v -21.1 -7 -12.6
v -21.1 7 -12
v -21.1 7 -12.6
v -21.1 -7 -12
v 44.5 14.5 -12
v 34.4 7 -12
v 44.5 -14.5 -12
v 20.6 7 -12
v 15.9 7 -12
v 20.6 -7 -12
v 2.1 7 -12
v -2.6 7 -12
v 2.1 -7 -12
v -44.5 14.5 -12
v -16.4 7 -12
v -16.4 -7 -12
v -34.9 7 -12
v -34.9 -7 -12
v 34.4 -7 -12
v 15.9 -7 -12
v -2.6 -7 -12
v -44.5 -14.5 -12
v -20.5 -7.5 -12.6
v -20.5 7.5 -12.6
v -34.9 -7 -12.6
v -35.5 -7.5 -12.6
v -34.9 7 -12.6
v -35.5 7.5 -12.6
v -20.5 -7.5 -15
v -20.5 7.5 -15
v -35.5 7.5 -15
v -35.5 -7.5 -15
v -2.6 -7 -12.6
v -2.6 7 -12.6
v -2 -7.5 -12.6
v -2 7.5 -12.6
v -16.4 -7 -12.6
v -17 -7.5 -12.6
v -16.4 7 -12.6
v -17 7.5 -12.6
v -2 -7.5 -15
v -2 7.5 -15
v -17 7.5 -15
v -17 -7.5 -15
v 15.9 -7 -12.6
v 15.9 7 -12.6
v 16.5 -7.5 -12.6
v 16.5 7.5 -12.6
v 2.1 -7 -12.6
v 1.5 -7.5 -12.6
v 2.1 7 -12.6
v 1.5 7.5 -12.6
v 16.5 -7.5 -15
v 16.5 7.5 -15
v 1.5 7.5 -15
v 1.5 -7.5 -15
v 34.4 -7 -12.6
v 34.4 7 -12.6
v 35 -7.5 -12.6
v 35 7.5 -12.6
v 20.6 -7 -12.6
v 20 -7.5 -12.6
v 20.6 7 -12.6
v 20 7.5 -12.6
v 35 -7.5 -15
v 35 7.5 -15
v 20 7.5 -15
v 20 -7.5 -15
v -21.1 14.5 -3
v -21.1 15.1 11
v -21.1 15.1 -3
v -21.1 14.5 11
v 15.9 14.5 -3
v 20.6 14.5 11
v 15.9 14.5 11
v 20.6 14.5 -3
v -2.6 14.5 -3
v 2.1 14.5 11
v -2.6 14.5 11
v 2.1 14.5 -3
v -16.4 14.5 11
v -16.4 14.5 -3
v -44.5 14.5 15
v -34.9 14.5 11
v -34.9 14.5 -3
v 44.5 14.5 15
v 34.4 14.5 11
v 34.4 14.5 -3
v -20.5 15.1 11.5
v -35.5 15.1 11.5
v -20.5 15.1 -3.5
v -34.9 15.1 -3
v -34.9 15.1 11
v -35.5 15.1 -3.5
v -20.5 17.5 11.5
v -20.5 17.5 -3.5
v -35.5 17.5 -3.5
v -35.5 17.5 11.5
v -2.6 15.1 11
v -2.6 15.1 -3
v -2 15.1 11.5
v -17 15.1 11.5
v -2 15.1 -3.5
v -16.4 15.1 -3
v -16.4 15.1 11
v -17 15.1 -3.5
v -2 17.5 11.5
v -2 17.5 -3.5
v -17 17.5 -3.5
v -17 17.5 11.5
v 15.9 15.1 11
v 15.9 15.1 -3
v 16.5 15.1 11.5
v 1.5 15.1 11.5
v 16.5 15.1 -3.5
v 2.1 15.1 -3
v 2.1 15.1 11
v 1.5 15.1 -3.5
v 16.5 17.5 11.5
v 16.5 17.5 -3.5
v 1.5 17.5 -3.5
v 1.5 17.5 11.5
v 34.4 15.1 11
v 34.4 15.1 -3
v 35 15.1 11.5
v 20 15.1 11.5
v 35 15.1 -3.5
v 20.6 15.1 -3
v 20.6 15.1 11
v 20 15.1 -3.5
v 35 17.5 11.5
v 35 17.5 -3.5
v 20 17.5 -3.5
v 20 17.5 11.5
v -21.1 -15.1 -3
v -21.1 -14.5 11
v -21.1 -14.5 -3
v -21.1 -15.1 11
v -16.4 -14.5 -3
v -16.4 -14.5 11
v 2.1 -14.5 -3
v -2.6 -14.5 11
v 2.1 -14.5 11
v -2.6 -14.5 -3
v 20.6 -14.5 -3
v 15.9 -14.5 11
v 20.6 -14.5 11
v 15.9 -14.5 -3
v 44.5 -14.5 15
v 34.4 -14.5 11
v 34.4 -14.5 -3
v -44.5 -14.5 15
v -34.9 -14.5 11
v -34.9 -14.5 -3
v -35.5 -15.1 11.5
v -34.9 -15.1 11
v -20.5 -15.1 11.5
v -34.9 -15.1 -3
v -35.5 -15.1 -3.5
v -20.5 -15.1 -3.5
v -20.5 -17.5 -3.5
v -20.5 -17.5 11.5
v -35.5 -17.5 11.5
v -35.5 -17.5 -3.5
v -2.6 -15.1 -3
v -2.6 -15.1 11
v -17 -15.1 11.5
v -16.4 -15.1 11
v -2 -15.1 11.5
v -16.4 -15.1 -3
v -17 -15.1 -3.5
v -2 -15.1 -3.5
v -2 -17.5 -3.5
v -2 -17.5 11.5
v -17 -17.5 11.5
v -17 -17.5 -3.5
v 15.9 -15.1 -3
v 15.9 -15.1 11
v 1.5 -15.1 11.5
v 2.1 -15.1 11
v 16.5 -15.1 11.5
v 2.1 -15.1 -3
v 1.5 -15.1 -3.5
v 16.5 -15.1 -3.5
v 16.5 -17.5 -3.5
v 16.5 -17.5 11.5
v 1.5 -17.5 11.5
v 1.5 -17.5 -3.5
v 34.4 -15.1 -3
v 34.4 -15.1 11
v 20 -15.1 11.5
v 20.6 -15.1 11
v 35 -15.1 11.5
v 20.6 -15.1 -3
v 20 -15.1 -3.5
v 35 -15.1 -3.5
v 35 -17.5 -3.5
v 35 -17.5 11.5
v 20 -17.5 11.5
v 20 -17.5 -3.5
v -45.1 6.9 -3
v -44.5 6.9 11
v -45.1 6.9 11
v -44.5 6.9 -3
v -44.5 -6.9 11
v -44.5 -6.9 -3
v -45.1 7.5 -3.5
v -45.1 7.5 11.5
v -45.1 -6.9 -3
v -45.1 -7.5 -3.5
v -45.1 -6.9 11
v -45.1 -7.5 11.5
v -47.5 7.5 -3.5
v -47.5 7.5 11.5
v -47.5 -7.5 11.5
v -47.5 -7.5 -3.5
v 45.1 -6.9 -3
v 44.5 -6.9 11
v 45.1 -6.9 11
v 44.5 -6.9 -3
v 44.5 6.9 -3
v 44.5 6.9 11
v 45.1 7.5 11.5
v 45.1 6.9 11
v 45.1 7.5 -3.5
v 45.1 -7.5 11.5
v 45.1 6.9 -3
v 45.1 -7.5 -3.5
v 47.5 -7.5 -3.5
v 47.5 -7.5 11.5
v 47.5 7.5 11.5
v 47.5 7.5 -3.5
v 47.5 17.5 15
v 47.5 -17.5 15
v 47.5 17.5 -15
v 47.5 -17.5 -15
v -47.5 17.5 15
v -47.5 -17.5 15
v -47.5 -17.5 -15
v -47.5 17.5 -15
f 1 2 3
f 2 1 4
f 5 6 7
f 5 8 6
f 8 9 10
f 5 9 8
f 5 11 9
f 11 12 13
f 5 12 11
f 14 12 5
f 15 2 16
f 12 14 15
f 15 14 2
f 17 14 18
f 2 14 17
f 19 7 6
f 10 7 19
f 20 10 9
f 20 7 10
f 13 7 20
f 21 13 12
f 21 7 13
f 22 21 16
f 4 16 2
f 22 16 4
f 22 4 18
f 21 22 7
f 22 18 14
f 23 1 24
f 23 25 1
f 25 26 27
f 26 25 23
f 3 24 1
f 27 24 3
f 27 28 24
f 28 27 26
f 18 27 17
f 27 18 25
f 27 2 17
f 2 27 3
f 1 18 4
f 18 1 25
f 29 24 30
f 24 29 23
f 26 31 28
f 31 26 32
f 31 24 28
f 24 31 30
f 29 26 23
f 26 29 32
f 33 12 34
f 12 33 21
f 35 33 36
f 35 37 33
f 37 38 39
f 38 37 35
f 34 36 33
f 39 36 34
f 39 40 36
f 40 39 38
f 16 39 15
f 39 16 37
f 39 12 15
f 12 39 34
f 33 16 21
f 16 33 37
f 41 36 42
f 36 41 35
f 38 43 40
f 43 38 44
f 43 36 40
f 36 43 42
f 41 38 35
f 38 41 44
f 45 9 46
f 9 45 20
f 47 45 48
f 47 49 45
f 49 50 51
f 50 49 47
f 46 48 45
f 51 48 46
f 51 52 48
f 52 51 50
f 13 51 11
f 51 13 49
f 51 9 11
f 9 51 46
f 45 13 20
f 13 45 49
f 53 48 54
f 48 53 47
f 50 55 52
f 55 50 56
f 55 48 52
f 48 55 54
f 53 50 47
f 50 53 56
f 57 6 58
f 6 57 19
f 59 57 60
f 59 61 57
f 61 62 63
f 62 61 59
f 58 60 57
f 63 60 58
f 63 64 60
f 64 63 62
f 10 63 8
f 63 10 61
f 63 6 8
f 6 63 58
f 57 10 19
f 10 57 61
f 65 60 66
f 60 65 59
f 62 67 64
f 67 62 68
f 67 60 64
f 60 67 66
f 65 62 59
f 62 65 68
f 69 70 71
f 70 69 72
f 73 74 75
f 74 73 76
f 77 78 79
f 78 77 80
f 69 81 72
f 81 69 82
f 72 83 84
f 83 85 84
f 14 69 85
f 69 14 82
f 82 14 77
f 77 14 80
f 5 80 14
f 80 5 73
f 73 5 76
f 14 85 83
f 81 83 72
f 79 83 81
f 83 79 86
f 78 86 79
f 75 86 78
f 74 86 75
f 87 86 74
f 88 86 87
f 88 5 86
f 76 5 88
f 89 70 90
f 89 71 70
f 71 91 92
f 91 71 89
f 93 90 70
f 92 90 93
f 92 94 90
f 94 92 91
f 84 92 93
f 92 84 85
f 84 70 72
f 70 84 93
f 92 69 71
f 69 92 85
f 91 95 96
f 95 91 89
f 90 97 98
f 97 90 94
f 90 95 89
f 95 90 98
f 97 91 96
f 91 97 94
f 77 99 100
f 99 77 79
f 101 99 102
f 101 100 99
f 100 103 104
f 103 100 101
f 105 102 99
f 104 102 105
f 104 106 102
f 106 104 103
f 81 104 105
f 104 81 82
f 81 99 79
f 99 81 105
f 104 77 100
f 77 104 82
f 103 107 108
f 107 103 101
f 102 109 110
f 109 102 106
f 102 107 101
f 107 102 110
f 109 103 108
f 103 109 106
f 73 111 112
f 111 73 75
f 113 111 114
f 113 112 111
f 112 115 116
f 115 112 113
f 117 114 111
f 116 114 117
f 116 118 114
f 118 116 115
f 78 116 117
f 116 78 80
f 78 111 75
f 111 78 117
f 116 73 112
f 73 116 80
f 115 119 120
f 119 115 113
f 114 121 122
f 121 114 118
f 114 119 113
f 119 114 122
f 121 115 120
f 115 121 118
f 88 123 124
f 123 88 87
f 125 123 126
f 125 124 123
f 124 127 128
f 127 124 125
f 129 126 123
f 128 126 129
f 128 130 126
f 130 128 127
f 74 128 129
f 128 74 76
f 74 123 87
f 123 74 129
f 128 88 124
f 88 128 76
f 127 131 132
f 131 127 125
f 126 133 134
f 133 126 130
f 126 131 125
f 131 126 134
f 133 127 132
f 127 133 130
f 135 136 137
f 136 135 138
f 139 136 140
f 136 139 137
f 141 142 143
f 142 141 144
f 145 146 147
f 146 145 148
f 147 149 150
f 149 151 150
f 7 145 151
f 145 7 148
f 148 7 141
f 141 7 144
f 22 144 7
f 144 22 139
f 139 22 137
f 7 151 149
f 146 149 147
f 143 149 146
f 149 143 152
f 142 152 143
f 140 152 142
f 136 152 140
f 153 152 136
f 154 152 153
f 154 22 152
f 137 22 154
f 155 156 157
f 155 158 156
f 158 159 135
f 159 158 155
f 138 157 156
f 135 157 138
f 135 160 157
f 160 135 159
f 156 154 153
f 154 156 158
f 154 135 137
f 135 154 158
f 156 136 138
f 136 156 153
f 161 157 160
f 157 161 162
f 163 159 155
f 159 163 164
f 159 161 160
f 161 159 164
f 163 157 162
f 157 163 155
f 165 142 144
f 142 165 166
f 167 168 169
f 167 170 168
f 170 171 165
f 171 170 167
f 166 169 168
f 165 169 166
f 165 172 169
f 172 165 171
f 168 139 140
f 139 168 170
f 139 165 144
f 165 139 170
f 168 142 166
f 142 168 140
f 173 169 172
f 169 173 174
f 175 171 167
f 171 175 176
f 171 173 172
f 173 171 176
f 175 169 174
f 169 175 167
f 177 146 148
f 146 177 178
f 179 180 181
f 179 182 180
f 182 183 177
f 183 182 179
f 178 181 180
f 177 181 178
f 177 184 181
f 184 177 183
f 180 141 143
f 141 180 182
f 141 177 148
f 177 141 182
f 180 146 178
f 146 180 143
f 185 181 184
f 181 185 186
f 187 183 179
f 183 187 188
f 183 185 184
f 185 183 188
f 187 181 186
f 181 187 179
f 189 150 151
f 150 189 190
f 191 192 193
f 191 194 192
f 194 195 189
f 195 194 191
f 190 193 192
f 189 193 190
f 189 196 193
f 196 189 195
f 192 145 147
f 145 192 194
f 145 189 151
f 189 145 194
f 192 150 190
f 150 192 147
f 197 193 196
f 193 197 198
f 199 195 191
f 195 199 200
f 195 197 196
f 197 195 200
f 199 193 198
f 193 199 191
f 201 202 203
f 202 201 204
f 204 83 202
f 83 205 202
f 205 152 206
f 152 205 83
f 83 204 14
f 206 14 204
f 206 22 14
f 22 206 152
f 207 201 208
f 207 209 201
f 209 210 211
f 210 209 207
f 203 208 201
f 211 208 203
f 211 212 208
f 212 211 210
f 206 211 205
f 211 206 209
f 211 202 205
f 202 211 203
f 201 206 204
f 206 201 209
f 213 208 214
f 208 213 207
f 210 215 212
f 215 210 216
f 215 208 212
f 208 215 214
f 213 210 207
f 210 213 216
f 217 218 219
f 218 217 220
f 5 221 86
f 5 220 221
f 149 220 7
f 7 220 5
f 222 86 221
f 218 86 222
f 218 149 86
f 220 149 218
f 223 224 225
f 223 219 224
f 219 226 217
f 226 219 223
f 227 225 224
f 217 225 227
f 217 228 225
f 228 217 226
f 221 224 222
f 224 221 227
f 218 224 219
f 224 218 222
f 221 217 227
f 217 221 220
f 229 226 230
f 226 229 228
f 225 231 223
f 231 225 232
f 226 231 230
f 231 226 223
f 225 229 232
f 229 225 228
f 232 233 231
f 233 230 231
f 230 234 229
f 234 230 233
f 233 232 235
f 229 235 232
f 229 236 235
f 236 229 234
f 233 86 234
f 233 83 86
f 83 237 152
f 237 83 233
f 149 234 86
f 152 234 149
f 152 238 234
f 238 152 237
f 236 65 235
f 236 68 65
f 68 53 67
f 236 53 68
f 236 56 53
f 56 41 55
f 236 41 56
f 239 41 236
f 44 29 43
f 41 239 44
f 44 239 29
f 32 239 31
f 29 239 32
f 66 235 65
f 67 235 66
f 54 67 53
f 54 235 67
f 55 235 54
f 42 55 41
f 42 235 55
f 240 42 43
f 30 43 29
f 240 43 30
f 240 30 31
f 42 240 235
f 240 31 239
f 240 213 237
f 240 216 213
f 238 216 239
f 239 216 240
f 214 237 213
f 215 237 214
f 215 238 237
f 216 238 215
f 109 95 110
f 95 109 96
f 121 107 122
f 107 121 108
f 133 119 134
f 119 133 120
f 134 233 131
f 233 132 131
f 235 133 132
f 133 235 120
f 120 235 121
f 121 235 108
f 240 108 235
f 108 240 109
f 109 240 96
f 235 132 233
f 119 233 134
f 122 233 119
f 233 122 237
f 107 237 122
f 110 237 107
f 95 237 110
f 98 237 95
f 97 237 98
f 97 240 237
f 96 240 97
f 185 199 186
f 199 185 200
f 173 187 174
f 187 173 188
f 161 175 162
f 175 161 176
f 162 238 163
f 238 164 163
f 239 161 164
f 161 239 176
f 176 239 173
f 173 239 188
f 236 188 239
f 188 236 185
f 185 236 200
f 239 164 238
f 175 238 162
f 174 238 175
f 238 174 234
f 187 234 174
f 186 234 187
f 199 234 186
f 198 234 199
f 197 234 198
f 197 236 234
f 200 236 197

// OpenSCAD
// file: kailhsocket.scad
$fn = $preview ? 10 : 60;

// hotswap
cyl_h = 3.05;
cyl_d = 3;

base_x = 4.75;
base_x_sum = 9.55;
base_y = 4.65;
base_y_sum = 6.85;
base_z = 1.8;

clip_x = 1.68;
clip_y = (13.15 - 9.95) / 2;
clip_z = 1.85;

// based on:
// https://www.kailhswitch.com/Content/upload/pdf/201915927/CPG135001D03_-_White_Clicky_Choc.pdf
module kailh_choc_switch()
{
    color("orange") union()
    {
        cube([ 15, 15, 0.8 ]);
        translate([ 0.6, 0.7, 0.8 ]) cube([ 13.8, 13.6, 2.2 ]);

        translate([ 7.5, 7.5, 3 ])
        {
            cylinder(h = 3, d = 3.4);

            translate([ 0, +5.5, 0 ]) cylinder(h = 3, d = 1.9);
            translate([ 0, -5.5, 0 ]) cylinder(h = 3, d = 1.9);

            // contacts
            translate([ -5.9, 0, 0 ]) cylinder(h = 3, d = 1.2);
            translate([ -3.8, -5, 0 ]) cylinder(h = 3, d = 1.2);
        }
    }
}

// based on:
// https://www.kailhswitch.com/Content/upload/pdf/202115927/CPG135001S30-data-sheet.pdf
module kailh_hot_swap_choc(extend_cables = 0)
{

    // fuck
    mirror([ 0, 0, 1 ]) union()
    {
        // plastic
        color("darkgray")
        {
            cube([ base_x, base_y, base_z ]);

            translate([ base_x_sum - base_x, base_y_sum - base_y, 0 ]) cube([ base_x, base_y, base_z ]);

            translate([ base_x / 2, base_y / 2, 0 ])
            {
                cylinder(h = cyl_h, d = cyl_d);
                translate([ 5, 2.2, 0 ]) cylinder(h = cyl_h, d = cyl_d);
            }
            translate([ base_x, 0, 0 ]) rotate([ 0, 0, 45 ]) cube([ base_x, base_y, base_z ]);
        }

        // metal
        color("gray")
        {
            translate([ -clip_x - extend_cables, base_y / 2 - clip_y / 2, 0 ])
                cube([ clip_x + base_y / 2 + extend_cables, clip_y, clip_z ]);
            translate([ base_x_sum - base_y / 2, base_y_sum - base_y / 2 - clip_y / 2, 0 ])
                cube([ clip_x + base_y / 2 + extend_cables, clip_y, clip_z ]);
        }
    }
}

module kailh_choc_socket()
{
    tolerance = 0.2;
    union()
    {
#translate([ 0, 0, -0.4 + tolerance / 2 ]) cube([ 13.6 + tolerance, 13.8 + tolerance, 0.8 - tolerance ], center = true);
        % translate([ -3, 3, 0 ]) text("↑", size = 5);
        // keycap
        % translate([ 0, 0, 5 ]) cube([ 17.5, 16.6, 5.2 ], center = true);
        translate([ 0, 0, -0.8 + tolerance - 2.5 ]) cube([ 15, 15, 5 ], center = true);
    }
}

difference()
{
    cube([ 20, 20, 3 ]);
    translate([ 2.5, 2.5, 0 ])
    {
        translate([ 0, 0, -3 ]) kailh_choc_switch();

        translate([ 7.5 - 3.8 + base_y / 2 + .05, 0.1, 3 ]) rotate([ 0, 0, 90 ]) kailh_hot_swap_choc(10);
    }
}

kailh_choc_socket();
// main file
use <kailhsocket.scad>

w = 95;
h = 35;
d = 30;

t = 3;
!difference()
{
    cube([ w, h, d ], center = true);

    translate([ 0, 0, t ])
    {
        cube([ w - t * 2, h - t * 2, d ], center = true);
    }

    // middle
    for (i = [0:3])
    {
        translate([ i * 18.5 - 28, 0, -d / 2 + t ])
        {
            kailh_choc_socket();
        }
    }

    // top
    for (i = [0:3])
    {
        rotate([ 90, 0, 0 ])
        {
            translate([ i * 18.5 - 28, 4, -h / 2 + t ])
            {
                kailh_choc_socket();
            }
        }
    }

    // bottom
    for (i = [0:3])
    {
        rotate([ -90, 0, 0 ])
        {
            translate([ i * 18.5 - 28, -4, -h / 2 + t ])
            {
                kailh_choc_socket();
            }
        }
    }

    // left
    rotate([ 90, 0, 90 ])
    {
        translate([ 0, 4, -w / 2 + t ])
        {
            kailh_choc_socket();
        }
    }

    // right
    rotate([ -90, 180, 90 ])
    {
        translate([ 0, 4, -w / 2 + t ])
        {
            kailh_choc_socket();
        }
    }
}

// case
gap = 5;
union(){difference(){translate([ 0, 0, -gap / 2 - t / 2 ])
                         cube([ w + t * 2 + gap * 2, h + gap * 2 + t * 2, d + gap + t ], center = true);
cube([ w + gap * 2, h + gap * 2, d + gap * 2 ], center = true);
}

difference()
{
    union()
    {
        translate([ w / 2, h / 2, -d / 2 ]) cube(gap * 2, center = true);
        translate([ w / 2, -h / 2, -d / 2 ]) cube(gap * 2, center = true);
        translate([ -w / 2, -h / 2, -d / 2 ]) cube(gap * 2, center = true);
        translate([ -w / 2, h / 2, -d / 2 ]) cube(gap * 2, center = true);
    }
    cube([ w, h, d ], center = true);
}
}

// lid
*difference()
{
    translate([ 0, 0, d / 2 + t / 2 ]) cube([ w + t * 2 + gap * 2, h + gap * 2 + t * 2, t * 2 ], center = true);

    union()
    {
        cube([ w, h, d ], center = true);

        translate([ 0, 0, t * 2 ])
        {
            cube([ w - t * 2, h - t * 2, d ], center = true);
        }
    }
    difference()
    {
        translate([ 0, 0, -gap / 2 - t / 2 ])
            cube([ w + t * 2 + gap * 2, h + gap * 2 + t * 2, d + gap + t ], center = true);
        cube([ w + gap * 2, h + gap * 2, d + gap * 2 ], center = true);
    }
}
